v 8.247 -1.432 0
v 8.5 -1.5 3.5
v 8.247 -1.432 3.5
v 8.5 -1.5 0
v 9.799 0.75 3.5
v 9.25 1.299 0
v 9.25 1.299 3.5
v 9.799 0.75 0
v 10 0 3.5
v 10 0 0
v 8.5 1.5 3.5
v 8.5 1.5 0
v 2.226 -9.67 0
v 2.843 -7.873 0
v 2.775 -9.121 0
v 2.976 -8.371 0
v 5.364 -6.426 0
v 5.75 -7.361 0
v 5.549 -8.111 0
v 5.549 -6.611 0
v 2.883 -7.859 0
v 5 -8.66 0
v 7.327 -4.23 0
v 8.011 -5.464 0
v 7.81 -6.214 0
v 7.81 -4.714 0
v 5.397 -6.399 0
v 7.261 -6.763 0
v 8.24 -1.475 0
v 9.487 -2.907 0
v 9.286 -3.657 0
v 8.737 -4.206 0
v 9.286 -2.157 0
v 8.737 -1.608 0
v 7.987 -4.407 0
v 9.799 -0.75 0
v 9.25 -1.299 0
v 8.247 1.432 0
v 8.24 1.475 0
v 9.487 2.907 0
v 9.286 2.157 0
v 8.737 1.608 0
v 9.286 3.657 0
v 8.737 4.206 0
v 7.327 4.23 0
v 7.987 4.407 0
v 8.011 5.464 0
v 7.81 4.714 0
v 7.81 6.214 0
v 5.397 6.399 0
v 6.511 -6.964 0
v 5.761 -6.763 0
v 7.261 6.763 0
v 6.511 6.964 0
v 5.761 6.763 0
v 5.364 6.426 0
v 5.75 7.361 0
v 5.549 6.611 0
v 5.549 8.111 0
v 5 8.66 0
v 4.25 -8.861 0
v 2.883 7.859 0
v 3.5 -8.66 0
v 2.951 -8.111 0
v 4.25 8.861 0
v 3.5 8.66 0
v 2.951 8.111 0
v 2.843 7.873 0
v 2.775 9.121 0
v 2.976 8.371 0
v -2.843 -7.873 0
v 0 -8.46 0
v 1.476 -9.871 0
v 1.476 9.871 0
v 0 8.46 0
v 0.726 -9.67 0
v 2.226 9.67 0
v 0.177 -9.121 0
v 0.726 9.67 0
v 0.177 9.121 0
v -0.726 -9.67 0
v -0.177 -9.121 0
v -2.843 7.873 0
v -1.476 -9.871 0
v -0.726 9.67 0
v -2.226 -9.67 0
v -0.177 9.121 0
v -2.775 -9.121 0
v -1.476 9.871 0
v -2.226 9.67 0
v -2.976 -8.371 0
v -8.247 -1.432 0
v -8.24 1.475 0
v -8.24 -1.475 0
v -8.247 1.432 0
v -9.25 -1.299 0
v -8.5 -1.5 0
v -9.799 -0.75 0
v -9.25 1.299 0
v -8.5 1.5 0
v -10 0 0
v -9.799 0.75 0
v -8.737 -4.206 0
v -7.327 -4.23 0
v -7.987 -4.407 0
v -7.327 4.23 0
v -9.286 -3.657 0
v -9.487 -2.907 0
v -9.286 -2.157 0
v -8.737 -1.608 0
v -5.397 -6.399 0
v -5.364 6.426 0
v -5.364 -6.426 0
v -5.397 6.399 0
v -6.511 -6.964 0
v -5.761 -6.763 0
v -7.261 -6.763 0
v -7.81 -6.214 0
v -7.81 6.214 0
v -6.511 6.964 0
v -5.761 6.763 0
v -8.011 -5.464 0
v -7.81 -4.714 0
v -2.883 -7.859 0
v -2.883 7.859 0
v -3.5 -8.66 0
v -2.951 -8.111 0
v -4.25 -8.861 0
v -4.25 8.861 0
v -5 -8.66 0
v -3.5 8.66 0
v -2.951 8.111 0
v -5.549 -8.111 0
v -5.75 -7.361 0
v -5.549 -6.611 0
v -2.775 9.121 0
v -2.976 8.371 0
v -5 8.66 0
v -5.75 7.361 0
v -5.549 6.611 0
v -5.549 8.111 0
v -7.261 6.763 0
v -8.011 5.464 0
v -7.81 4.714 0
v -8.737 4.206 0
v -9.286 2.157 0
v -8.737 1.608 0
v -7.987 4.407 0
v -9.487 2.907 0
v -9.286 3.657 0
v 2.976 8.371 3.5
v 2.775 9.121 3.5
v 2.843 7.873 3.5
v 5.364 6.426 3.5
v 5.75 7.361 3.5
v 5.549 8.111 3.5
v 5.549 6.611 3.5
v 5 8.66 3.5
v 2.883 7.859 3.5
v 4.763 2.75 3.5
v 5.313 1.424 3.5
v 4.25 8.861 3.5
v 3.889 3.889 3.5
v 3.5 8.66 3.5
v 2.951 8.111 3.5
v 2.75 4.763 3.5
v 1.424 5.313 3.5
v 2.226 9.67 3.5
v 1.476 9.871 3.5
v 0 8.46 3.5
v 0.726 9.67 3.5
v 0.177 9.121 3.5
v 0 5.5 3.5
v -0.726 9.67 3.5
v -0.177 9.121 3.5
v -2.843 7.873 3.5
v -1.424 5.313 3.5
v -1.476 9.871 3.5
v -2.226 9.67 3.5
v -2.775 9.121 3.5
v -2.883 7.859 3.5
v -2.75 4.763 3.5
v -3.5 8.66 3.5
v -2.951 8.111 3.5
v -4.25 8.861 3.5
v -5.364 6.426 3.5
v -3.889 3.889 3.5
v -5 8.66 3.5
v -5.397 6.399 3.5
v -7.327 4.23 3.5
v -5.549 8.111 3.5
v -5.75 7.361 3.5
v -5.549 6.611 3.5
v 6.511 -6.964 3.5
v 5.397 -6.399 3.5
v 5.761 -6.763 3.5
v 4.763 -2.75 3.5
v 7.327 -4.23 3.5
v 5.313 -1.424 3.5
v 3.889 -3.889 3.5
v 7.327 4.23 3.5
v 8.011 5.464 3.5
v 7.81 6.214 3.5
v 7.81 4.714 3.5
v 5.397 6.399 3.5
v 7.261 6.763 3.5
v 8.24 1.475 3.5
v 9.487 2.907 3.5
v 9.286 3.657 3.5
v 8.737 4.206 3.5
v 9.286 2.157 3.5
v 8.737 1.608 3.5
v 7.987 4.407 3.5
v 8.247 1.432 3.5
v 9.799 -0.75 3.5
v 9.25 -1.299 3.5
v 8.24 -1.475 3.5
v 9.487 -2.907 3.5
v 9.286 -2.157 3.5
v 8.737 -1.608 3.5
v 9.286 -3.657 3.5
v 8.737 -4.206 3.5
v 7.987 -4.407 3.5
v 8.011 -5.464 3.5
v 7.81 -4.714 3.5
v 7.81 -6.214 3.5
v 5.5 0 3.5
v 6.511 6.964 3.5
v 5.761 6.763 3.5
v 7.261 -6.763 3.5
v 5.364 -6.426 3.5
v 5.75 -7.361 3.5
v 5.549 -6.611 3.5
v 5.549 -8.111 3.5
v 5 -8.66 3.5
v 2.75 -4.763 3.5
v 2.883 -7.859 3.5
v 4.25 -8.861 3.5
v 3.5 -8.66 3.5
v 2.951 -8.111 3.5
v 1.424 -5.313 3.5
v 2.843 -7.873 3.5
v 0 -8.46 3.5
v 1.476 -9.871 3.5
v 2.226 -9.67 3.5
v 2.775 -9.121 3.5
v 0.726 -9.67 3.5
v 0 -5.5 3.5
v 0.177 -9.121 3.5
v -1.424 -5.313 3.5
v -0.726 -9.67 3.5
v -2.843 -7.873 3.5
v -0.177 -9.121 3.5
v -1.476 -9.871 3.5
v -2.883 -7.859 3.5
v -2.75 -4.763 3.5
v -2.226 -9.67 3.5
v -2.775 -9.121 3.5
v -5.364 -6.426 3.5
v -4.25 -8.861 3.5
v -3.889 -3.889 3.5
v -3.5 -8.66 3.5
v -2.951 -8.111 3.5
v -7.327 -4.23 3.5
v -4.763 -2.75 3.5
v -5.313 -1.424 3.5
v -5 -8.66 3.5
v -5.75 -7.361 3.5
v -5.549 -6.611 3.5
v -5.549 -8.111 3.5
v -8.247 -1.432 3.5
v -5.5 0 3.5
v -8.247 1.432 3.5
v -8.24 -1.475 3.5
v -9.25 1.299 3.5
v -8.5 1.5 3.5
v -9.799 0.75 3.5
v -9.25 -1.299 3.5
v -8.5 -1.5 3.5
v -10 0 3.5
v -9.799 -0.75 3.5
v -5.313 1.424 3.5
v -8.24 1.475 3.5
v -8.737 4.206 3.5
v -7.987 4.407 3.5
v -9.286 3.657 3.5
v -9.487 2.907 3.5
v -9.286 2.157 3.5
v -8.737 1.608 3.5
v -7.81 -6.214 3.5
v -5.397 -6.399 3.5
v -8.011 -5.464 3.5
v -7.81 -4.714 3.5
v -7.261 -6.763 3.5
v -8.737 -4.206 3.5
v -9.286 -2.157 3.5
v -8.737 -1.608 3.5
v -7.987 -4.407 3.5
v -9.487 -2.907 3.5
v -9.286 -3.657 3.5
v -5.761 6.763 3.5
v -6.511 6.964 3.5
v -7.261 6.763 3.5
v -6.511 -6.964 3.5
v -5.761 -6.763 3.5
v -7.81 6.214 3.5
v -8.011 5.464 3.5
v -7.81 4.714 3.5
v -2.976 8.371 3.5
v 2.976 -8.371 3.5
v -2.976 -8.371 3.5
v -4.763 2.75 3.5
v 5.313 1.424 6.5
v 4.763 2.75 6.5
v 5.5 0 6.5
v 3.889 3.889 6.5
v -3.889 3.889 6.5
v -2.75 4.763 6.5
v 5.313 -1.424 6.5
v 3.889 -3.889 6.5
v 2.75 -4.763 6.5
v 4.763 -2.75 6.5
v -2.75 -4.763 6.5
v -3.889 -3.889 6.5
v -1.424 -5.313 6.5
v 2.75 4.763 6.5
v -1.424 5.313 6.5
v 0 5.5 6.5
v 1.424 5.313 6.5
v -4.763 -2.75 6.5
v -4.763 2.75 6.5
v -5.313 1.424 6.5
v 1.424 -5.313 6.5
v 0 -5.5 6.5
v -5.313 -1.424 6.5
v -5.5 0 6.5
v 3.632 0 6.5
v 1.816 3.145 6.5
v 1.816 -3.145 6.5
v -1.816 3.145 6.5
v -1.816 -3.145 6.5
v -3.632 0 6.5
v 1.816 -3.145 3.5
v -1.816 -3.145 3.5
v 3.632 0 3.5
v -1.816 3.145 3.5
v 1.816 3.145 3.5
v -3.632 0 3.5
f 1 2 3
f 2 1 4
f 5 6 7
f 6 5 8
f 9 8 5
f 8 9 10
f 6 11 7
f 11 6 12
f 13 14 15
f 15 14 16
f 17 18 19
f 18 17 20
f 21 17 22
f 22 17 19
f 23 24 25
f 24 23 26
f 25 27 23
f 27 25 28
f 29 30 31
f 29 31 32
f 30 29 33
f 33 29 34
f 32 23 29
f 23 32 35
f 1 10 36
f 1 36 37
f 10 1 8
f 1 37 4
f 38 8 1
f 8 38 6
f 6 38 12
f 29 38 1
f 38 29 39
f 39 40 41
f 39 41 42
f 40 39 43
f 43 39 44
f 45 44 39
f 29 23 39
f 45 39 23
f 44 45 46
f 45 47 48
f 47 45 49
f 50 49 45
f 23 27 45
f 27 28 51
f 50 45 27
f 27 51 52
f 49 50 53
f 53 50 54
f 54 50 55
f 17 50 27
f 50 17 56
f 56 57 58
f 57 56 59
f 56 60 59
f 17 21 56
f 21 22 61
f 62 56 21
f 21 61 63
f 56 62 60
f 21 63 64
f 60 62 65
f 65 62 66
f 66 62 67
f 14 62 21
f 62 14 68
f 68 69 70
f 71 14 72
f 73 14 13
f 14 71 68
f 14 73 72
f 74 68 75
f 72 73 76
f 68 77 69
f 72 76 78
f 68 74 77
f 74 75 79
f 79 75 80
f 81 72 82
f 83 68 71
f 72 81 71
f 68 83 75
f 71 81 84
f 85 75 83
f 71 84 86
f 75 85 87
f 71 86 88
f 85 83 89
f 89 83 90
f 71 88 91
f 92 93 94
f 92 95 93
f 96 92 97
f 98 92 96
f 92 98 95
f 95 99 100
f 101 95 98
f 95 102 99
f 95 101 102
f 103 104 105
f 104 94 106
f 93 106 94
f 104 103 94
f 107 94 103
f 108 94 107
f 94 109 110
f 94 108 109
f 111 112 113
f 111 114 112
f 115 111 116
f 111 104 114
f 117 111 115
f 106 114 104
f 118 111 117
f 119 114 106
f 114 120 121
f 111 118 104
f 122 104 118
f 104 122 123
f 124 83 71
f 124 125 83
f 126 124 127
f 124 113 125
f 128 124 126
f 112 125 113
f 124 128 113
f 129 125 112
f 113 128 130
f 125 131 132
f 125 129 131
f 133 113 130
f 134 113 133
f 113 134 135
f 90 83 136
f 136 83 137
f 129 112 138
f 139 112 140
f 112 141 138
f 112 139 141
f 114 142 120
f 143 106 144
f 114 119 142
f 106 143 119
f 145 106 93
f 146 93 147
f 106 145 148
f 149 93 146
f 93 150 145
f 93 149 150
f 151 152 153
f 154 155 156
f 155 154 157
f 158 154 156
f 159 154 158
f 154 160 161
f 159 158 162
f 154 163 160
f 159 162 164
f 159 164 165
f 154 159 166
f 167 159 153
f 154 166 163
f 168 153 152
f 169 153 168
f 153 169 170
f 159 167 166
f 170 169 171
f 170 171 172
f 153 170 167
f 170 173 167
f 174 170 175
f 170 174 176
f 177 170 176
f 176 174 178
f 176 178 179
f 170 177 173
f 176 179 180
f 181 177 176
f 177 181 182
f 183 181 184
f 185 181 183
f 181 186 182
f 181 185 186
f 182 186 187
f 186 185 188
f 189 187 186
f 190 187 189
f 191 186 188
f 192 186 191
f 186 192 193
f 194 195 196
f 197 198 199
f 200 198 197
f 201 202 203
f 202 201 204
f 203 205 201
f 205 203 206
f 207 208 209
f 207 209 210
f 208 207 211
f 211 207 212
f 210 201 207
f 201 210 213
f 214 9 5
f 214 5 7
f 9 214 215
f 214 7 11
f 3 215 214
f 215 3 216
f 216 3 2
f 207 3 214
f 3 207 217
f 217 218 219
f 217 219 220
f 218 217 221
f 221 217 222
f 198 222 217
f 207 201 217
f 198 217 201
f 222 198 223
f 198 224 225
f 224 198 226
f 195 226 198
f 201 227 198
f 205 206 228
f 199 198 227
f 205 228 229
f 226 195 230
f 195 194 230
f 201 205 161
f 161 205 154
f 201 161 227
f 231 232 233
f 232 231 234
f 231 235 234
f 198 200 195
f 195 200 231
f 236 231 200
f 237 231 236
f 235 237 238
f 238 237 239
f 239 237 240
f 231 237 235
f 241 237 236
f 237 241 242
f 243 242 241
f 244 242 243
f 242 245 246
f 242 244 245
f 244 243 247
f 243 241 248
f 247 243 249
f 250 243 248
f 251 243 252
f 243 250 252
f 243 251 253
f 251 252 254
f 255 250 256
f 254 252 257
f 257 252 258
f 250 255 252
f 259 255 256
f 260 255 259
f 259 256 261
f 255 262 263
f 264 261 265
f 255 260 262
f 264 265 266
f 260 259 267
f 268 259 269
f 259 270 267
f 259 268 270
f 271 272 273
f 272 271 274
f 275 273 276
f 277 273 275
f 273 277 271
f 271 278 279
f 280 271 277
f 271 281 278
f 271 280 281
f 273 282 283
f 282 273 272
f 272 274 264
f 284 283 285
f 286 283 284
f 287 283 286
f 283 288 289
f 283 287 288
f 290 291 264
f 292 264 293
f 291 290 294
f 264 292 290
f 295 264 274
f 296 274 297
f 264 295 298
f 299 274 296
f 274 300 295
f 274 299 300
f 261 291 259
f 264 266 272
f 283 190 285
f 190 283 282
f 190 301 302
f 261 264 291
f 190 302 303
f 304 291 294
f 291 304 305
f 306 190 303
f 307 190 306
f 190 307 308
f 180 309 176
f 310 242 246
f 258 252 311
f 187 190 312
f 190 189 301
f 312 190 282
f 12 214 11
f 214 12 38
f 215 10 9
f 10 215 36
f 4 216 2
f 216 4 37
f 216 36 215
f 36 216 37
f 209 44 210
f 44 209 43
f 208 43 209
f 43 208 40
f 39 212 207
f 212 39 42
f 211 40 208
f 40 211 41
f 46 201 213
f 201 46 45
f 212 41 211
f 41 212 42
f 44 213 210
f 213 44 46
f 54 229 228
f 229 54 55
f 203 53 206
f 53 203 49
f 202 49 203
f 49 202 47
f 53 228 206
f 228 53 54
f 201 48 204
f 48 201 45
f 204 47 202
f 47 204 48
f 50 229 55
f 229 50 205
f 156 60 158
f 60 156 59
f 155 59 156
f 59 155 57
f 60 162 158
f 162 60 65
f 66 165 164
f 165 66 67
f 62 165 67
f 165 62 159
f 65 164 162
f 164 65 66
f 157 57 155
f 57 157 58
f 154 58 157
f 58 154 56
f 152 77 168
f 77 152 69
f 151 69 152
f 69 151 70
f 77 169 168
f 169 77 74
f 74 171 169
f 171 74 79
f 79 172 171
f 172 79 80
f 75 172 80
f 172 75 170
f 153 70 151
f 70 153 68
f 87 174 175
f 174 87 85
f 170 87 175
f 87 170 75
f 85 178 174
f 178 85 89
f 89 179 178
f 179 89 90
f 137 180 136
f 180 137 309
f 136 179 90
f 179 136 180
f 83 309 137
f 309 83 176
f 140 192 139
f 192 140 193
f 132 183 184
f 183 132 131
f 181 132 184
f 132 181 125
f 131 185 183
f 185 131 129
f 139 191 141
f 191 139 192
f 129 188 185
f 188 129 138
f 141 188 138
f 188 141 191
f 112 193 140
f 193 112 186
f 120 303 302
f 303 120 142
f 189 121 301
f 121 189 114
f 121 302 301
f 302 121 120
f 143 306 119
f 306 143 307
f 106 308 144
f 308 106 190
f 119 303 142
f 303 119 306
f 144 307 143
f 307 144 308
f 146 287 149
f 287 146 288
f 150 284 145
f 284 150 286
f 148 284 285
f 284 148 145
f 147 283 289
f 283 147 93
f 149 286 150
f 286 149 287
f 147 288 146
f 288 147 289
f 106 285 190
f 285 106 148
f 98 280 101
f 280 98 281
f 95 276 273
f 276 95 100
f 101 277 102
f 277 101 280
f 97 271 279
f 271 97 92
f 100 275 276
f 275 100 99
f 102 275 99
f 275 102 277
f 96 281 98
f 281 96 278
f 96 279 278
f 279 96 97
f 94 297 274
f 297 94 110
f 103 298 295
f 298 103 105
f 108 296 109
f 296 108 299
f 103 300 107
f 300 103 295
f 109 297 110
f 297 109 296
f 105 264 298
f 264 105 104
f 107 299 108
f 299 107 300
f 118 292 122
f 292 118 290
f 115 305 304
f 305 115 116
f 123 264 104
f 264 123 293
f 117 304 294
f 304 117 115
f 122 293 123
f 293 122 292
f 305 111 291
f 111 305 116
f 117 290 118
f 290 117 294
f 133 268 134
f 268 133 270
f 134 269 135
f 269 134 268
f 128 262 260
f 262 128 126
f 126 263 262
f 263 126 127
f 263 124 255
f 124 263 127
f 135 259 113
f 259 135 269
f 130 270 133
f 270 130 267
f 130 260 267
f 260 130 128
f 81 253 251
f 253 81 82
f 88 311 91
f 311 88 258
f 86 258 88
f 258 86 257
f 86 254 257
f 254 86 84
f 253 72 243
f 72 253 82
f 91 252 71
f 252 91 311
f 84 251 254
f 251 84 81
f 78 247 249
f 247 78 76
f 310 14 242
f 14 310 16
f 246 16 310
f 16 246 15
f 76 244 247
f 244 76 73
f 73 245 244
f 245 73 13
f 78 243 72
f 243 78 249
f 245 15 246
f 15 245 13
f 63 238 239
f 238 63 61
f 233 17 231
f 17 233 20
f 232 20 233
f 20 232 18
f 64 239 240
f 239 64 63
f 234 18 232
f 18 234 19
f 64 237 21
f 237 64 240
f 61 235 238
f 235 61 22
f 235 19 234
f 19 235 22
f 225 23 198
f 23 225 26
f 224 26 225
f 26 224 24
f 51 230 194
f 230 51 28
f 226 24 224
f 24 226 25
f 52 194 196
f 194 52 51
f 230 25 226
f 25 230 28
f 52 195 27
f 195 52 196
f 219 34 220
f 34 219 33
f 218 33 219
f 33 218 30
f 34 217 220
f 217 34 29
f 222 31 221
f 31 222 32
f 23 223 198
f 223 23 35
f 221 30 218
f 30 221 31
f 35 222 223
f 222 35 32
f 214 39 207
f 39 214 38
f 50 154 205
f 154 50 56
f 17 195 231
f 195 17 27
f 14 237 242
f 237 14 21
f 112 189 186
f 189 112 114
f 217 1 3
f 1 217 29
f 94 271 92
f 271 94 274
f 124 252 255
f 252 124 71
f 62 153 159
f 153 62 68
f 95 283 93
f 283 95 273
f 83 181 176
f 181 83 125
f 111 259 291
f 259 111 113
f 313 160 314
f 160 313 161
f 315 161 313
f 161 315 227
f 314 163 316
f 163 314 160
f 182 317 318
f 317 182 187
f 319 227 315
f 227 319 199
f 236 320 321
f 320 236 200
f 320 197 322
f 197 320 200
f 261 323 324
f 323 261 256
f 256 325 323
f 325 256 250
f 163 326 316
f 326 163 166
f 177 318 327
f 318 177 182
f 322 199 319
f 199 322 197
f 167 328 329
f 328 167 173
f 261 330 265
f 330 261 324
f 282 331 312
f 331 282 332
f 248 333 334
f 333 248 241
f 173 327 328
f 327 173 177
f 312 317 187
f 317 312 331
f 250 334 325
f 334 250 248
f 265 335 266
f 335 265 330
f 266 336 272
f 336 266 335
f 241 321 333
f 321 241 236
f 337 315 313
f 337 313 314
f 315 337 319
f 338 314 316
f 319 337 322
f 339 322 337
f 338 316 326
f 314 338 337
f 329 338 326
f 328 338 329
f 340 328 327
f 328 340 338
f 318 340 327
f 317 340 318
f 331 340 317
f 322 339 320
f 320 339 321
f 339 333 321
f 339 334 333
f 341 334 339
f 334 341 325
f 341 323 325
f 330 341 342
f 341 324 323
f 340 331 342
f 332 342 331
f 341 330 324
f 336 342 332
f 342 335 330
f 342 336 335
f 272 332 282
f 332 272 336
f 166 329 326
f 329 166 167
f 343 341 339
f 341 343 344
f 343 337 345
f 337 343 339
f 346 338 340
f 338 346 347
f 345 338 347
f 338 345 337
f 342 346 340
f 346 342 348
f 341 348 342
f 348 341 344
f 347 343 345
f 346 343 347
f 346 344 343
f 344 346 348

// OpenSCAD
height = 6.5;
thick_height = 3.5;
diameter = 11;
thick_diameter = 17;

hole_diameter_tolerance = 0;
hole_diameter_base_size = 0;
nut_thickness = 3;
nut_width_tolerance = 0.35;
nut_width_base_size = 5.94;

module dummy() {}

hole_diameter = hole_diameter_base_size + hole_diameter_tolerance;
nut_width = nut_width_base_size + nut_width_tolerance;

nudge = 0.001;

pi = 3.141592653589793;

module knurledCylinder(h=10,r1=5,r2=1.5) {
    n = ceil(2 * pi * r1 / (2 * r2));
    cylinder(h=h,r=r1,$fn=n);
    for (i=[0:n-1]) {
        x = r1*cos(360./n*i);
        y = r1*sin(360./n*i);
        translate([x,y,0]) cylinder(h=h,r=r2,$fn=12);
    }
}

render(convexity=10)
difference() {
    union() {
        cylinder(h=height,r=diameter/2,$fn=24);
        knurledCylinder(h=thick_height,r1=thick_diameter/2);
    }
    translate([0,0,-nudge]) cylinder(h=height+2*nudge,d=hole_diameter,$fn=12);
    translate([0,0,height-nut_thickness])
    cylinder(h=nut_thickness+nudge,d=nut_width*2/sqrt(3), $fn=6);
}
